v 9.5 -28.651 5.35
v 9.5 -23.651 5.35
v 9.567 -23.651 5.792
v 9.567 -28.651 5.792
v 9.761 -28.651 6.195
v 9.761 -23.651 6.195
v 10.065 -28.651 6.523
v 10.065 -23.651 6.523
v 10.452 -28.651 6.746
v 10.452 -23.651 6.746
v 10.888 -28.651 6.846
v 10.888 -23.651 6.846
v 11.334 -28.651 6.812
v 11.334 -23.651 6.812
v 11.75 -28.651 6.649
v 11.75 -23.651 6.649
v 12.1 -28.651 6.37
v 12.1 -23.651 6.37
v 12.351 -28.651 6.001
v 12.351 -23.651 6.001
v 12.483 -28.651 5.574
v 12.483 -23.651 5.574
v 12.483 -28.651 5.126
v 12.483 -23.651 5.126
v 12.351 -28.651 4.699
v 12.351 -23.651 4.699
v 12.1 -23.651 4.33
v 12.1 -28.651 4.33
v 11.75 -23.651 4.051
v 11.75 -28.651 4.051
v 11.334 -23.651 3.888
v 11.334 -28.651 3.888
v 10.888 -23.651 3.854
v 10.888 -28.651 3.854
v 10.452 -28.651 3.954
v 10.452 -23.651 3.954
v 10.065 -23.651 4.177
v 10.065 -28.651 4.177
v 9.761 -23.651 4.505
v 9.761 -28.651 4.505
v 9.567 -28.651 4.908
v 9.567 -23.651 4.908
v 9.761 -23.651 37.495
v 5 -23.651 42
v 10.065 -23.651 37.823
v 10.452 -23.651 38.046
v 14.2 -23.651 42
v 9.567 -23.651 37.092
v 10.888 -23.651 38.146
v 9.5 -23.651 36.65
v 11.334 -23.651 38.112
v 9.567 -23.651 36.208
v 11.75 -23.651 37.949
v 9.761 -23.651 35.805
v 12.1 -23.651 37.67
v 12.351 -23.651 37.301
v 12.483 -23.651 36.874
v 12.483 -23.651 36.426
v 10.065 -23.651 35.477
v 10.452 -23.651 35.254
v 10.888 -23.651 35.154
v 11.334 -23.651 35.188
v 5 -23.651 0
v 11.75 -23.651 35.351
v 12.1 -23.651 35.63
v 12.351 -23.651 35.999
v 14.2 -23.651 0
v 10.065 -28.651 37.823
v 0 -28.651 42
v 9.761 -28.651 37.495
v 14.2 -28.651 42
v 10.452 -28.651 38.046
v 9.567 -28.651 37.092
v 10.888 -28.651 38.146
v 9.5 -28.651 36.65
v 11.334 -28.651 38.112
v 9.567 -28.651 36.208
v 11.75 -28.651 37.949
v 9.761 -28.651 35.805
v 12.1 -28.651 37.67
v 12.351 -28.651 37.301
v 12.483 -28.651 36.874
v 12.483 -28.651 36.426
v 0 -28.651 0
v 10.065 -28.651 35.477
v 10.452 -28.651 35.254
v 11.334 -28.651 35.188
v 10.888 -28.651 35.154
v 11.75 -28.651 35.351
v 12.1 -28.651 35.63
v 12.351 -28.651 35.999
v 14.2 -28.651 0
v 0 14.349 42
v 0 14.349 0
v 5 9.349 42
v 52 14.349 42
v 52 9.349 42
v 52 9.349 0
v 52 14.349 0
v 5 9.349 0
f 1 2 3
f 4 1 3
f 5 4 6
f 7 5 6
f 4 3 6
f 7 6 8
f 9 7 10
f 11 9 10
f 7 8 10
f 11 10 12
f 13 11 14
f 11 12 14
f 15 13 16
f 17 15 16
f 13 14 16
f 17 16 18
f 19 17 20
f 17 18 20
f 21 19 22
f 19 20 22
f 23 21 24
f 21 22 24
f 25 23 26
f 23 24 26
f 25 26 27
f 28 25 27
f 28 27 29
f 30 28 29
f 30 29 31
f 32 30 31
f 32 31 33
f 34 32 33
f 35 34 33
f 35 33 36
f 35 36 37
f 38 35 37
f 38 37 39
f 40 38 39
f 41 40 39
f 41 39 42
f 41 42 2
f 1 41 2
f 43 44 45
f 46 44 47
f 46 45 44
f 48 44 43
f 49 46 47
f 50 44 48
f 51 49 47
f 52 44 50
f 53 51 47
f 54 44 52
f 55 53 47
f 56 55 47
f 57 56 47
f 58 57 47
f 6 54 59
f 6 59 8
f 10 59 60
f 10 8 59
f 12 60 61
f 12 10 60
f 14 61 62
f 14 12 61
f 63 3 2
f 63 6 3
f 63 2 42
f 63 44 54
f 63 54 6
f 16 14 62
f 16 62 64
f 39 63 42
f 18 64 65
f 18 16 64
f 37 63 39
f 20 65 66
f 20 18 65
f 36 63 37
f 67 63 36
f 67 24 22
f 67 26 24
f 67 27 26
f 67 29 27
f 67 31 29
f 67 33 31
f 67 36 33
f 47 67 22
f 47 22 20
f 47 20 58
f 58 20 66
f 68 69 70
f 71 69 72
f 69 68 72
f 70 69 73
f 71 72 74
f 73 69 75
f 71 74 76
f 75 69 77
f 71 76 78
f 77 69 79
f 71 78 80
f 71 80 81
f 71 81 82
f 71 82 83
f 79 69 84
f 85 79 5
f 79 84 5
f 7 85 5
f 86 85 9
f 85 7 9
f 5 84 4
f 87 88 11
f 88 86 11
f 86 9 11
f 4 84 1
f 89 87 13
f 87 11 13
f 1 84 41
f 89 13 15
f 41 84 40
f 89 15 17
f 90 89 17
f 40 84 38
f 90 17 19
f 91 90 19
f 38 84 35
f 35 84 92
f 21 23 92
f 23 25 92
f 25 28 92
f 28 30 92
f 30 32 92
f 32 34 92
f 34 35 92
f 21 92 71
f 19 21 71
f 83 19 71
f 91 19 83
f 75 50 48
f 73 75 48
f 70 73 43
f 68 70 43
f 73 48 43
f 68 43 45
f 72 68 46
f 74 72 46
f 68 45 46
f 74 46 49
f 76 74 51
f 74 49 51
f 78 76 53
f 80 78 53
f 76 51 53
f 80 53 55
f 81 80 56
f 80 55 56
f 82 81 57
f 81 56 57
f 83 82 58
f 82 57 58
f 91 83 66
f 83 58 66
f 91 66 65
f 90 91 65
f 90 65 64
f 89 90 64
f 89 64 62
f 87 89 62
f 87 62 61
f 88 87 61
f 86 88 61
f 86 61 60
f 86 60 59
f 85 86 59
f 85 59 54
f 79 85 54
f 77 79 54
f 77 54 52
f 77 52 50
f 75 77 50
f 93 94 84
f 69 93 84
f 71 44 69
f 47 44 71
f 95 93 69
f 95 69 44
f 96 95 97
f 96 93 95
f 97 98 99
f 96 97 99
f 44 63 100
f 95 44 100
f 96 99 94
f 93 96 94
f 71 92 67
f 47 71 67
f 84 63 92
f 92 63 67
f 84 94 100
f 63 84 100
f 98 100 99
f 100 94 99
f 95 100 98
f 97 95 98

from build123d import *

# Parameters (mm, degrees)
F0_W     = 9.2
F0_H     = 5
F1_DEPTH = 42
F3_D     = 3
F3_DEPTH = 12
F4_D     = 3
F4_DEPTH = 12


with BuildPart() as f1:
    # F0 (on Top) → F1 (new body)
    with BuildSketch(Plane.XY):
        Polygon((0, 14.349465), (0, 9.349465), (5, 9.349465), (52, 9.349465), (52, 14.349465), align=None)
        Polygon((5, 9.349465), (0, 9.349465), (0, -28.650535), (5, -28.650535), (5, -23.650535), align=None)
        with Locations((9.6, -26.150535)):
            Rectangle(F0_W, F0_H)
    extrude(amount=F1_DEPTH)

    # F3
    with Locations(Plane.XZ.offset(28.650535)):
        with Locations((11, 36.65)):
            Hole(F3_D / 2, depth=F3_DEPTH)

    # F4
    with Locations(Plane.XZ.offset(28.650535)):
        with Locations((11, 5.35)):
            Hole(F4_D / 2, depth=F4_DEPTH)


solid = f1.part
